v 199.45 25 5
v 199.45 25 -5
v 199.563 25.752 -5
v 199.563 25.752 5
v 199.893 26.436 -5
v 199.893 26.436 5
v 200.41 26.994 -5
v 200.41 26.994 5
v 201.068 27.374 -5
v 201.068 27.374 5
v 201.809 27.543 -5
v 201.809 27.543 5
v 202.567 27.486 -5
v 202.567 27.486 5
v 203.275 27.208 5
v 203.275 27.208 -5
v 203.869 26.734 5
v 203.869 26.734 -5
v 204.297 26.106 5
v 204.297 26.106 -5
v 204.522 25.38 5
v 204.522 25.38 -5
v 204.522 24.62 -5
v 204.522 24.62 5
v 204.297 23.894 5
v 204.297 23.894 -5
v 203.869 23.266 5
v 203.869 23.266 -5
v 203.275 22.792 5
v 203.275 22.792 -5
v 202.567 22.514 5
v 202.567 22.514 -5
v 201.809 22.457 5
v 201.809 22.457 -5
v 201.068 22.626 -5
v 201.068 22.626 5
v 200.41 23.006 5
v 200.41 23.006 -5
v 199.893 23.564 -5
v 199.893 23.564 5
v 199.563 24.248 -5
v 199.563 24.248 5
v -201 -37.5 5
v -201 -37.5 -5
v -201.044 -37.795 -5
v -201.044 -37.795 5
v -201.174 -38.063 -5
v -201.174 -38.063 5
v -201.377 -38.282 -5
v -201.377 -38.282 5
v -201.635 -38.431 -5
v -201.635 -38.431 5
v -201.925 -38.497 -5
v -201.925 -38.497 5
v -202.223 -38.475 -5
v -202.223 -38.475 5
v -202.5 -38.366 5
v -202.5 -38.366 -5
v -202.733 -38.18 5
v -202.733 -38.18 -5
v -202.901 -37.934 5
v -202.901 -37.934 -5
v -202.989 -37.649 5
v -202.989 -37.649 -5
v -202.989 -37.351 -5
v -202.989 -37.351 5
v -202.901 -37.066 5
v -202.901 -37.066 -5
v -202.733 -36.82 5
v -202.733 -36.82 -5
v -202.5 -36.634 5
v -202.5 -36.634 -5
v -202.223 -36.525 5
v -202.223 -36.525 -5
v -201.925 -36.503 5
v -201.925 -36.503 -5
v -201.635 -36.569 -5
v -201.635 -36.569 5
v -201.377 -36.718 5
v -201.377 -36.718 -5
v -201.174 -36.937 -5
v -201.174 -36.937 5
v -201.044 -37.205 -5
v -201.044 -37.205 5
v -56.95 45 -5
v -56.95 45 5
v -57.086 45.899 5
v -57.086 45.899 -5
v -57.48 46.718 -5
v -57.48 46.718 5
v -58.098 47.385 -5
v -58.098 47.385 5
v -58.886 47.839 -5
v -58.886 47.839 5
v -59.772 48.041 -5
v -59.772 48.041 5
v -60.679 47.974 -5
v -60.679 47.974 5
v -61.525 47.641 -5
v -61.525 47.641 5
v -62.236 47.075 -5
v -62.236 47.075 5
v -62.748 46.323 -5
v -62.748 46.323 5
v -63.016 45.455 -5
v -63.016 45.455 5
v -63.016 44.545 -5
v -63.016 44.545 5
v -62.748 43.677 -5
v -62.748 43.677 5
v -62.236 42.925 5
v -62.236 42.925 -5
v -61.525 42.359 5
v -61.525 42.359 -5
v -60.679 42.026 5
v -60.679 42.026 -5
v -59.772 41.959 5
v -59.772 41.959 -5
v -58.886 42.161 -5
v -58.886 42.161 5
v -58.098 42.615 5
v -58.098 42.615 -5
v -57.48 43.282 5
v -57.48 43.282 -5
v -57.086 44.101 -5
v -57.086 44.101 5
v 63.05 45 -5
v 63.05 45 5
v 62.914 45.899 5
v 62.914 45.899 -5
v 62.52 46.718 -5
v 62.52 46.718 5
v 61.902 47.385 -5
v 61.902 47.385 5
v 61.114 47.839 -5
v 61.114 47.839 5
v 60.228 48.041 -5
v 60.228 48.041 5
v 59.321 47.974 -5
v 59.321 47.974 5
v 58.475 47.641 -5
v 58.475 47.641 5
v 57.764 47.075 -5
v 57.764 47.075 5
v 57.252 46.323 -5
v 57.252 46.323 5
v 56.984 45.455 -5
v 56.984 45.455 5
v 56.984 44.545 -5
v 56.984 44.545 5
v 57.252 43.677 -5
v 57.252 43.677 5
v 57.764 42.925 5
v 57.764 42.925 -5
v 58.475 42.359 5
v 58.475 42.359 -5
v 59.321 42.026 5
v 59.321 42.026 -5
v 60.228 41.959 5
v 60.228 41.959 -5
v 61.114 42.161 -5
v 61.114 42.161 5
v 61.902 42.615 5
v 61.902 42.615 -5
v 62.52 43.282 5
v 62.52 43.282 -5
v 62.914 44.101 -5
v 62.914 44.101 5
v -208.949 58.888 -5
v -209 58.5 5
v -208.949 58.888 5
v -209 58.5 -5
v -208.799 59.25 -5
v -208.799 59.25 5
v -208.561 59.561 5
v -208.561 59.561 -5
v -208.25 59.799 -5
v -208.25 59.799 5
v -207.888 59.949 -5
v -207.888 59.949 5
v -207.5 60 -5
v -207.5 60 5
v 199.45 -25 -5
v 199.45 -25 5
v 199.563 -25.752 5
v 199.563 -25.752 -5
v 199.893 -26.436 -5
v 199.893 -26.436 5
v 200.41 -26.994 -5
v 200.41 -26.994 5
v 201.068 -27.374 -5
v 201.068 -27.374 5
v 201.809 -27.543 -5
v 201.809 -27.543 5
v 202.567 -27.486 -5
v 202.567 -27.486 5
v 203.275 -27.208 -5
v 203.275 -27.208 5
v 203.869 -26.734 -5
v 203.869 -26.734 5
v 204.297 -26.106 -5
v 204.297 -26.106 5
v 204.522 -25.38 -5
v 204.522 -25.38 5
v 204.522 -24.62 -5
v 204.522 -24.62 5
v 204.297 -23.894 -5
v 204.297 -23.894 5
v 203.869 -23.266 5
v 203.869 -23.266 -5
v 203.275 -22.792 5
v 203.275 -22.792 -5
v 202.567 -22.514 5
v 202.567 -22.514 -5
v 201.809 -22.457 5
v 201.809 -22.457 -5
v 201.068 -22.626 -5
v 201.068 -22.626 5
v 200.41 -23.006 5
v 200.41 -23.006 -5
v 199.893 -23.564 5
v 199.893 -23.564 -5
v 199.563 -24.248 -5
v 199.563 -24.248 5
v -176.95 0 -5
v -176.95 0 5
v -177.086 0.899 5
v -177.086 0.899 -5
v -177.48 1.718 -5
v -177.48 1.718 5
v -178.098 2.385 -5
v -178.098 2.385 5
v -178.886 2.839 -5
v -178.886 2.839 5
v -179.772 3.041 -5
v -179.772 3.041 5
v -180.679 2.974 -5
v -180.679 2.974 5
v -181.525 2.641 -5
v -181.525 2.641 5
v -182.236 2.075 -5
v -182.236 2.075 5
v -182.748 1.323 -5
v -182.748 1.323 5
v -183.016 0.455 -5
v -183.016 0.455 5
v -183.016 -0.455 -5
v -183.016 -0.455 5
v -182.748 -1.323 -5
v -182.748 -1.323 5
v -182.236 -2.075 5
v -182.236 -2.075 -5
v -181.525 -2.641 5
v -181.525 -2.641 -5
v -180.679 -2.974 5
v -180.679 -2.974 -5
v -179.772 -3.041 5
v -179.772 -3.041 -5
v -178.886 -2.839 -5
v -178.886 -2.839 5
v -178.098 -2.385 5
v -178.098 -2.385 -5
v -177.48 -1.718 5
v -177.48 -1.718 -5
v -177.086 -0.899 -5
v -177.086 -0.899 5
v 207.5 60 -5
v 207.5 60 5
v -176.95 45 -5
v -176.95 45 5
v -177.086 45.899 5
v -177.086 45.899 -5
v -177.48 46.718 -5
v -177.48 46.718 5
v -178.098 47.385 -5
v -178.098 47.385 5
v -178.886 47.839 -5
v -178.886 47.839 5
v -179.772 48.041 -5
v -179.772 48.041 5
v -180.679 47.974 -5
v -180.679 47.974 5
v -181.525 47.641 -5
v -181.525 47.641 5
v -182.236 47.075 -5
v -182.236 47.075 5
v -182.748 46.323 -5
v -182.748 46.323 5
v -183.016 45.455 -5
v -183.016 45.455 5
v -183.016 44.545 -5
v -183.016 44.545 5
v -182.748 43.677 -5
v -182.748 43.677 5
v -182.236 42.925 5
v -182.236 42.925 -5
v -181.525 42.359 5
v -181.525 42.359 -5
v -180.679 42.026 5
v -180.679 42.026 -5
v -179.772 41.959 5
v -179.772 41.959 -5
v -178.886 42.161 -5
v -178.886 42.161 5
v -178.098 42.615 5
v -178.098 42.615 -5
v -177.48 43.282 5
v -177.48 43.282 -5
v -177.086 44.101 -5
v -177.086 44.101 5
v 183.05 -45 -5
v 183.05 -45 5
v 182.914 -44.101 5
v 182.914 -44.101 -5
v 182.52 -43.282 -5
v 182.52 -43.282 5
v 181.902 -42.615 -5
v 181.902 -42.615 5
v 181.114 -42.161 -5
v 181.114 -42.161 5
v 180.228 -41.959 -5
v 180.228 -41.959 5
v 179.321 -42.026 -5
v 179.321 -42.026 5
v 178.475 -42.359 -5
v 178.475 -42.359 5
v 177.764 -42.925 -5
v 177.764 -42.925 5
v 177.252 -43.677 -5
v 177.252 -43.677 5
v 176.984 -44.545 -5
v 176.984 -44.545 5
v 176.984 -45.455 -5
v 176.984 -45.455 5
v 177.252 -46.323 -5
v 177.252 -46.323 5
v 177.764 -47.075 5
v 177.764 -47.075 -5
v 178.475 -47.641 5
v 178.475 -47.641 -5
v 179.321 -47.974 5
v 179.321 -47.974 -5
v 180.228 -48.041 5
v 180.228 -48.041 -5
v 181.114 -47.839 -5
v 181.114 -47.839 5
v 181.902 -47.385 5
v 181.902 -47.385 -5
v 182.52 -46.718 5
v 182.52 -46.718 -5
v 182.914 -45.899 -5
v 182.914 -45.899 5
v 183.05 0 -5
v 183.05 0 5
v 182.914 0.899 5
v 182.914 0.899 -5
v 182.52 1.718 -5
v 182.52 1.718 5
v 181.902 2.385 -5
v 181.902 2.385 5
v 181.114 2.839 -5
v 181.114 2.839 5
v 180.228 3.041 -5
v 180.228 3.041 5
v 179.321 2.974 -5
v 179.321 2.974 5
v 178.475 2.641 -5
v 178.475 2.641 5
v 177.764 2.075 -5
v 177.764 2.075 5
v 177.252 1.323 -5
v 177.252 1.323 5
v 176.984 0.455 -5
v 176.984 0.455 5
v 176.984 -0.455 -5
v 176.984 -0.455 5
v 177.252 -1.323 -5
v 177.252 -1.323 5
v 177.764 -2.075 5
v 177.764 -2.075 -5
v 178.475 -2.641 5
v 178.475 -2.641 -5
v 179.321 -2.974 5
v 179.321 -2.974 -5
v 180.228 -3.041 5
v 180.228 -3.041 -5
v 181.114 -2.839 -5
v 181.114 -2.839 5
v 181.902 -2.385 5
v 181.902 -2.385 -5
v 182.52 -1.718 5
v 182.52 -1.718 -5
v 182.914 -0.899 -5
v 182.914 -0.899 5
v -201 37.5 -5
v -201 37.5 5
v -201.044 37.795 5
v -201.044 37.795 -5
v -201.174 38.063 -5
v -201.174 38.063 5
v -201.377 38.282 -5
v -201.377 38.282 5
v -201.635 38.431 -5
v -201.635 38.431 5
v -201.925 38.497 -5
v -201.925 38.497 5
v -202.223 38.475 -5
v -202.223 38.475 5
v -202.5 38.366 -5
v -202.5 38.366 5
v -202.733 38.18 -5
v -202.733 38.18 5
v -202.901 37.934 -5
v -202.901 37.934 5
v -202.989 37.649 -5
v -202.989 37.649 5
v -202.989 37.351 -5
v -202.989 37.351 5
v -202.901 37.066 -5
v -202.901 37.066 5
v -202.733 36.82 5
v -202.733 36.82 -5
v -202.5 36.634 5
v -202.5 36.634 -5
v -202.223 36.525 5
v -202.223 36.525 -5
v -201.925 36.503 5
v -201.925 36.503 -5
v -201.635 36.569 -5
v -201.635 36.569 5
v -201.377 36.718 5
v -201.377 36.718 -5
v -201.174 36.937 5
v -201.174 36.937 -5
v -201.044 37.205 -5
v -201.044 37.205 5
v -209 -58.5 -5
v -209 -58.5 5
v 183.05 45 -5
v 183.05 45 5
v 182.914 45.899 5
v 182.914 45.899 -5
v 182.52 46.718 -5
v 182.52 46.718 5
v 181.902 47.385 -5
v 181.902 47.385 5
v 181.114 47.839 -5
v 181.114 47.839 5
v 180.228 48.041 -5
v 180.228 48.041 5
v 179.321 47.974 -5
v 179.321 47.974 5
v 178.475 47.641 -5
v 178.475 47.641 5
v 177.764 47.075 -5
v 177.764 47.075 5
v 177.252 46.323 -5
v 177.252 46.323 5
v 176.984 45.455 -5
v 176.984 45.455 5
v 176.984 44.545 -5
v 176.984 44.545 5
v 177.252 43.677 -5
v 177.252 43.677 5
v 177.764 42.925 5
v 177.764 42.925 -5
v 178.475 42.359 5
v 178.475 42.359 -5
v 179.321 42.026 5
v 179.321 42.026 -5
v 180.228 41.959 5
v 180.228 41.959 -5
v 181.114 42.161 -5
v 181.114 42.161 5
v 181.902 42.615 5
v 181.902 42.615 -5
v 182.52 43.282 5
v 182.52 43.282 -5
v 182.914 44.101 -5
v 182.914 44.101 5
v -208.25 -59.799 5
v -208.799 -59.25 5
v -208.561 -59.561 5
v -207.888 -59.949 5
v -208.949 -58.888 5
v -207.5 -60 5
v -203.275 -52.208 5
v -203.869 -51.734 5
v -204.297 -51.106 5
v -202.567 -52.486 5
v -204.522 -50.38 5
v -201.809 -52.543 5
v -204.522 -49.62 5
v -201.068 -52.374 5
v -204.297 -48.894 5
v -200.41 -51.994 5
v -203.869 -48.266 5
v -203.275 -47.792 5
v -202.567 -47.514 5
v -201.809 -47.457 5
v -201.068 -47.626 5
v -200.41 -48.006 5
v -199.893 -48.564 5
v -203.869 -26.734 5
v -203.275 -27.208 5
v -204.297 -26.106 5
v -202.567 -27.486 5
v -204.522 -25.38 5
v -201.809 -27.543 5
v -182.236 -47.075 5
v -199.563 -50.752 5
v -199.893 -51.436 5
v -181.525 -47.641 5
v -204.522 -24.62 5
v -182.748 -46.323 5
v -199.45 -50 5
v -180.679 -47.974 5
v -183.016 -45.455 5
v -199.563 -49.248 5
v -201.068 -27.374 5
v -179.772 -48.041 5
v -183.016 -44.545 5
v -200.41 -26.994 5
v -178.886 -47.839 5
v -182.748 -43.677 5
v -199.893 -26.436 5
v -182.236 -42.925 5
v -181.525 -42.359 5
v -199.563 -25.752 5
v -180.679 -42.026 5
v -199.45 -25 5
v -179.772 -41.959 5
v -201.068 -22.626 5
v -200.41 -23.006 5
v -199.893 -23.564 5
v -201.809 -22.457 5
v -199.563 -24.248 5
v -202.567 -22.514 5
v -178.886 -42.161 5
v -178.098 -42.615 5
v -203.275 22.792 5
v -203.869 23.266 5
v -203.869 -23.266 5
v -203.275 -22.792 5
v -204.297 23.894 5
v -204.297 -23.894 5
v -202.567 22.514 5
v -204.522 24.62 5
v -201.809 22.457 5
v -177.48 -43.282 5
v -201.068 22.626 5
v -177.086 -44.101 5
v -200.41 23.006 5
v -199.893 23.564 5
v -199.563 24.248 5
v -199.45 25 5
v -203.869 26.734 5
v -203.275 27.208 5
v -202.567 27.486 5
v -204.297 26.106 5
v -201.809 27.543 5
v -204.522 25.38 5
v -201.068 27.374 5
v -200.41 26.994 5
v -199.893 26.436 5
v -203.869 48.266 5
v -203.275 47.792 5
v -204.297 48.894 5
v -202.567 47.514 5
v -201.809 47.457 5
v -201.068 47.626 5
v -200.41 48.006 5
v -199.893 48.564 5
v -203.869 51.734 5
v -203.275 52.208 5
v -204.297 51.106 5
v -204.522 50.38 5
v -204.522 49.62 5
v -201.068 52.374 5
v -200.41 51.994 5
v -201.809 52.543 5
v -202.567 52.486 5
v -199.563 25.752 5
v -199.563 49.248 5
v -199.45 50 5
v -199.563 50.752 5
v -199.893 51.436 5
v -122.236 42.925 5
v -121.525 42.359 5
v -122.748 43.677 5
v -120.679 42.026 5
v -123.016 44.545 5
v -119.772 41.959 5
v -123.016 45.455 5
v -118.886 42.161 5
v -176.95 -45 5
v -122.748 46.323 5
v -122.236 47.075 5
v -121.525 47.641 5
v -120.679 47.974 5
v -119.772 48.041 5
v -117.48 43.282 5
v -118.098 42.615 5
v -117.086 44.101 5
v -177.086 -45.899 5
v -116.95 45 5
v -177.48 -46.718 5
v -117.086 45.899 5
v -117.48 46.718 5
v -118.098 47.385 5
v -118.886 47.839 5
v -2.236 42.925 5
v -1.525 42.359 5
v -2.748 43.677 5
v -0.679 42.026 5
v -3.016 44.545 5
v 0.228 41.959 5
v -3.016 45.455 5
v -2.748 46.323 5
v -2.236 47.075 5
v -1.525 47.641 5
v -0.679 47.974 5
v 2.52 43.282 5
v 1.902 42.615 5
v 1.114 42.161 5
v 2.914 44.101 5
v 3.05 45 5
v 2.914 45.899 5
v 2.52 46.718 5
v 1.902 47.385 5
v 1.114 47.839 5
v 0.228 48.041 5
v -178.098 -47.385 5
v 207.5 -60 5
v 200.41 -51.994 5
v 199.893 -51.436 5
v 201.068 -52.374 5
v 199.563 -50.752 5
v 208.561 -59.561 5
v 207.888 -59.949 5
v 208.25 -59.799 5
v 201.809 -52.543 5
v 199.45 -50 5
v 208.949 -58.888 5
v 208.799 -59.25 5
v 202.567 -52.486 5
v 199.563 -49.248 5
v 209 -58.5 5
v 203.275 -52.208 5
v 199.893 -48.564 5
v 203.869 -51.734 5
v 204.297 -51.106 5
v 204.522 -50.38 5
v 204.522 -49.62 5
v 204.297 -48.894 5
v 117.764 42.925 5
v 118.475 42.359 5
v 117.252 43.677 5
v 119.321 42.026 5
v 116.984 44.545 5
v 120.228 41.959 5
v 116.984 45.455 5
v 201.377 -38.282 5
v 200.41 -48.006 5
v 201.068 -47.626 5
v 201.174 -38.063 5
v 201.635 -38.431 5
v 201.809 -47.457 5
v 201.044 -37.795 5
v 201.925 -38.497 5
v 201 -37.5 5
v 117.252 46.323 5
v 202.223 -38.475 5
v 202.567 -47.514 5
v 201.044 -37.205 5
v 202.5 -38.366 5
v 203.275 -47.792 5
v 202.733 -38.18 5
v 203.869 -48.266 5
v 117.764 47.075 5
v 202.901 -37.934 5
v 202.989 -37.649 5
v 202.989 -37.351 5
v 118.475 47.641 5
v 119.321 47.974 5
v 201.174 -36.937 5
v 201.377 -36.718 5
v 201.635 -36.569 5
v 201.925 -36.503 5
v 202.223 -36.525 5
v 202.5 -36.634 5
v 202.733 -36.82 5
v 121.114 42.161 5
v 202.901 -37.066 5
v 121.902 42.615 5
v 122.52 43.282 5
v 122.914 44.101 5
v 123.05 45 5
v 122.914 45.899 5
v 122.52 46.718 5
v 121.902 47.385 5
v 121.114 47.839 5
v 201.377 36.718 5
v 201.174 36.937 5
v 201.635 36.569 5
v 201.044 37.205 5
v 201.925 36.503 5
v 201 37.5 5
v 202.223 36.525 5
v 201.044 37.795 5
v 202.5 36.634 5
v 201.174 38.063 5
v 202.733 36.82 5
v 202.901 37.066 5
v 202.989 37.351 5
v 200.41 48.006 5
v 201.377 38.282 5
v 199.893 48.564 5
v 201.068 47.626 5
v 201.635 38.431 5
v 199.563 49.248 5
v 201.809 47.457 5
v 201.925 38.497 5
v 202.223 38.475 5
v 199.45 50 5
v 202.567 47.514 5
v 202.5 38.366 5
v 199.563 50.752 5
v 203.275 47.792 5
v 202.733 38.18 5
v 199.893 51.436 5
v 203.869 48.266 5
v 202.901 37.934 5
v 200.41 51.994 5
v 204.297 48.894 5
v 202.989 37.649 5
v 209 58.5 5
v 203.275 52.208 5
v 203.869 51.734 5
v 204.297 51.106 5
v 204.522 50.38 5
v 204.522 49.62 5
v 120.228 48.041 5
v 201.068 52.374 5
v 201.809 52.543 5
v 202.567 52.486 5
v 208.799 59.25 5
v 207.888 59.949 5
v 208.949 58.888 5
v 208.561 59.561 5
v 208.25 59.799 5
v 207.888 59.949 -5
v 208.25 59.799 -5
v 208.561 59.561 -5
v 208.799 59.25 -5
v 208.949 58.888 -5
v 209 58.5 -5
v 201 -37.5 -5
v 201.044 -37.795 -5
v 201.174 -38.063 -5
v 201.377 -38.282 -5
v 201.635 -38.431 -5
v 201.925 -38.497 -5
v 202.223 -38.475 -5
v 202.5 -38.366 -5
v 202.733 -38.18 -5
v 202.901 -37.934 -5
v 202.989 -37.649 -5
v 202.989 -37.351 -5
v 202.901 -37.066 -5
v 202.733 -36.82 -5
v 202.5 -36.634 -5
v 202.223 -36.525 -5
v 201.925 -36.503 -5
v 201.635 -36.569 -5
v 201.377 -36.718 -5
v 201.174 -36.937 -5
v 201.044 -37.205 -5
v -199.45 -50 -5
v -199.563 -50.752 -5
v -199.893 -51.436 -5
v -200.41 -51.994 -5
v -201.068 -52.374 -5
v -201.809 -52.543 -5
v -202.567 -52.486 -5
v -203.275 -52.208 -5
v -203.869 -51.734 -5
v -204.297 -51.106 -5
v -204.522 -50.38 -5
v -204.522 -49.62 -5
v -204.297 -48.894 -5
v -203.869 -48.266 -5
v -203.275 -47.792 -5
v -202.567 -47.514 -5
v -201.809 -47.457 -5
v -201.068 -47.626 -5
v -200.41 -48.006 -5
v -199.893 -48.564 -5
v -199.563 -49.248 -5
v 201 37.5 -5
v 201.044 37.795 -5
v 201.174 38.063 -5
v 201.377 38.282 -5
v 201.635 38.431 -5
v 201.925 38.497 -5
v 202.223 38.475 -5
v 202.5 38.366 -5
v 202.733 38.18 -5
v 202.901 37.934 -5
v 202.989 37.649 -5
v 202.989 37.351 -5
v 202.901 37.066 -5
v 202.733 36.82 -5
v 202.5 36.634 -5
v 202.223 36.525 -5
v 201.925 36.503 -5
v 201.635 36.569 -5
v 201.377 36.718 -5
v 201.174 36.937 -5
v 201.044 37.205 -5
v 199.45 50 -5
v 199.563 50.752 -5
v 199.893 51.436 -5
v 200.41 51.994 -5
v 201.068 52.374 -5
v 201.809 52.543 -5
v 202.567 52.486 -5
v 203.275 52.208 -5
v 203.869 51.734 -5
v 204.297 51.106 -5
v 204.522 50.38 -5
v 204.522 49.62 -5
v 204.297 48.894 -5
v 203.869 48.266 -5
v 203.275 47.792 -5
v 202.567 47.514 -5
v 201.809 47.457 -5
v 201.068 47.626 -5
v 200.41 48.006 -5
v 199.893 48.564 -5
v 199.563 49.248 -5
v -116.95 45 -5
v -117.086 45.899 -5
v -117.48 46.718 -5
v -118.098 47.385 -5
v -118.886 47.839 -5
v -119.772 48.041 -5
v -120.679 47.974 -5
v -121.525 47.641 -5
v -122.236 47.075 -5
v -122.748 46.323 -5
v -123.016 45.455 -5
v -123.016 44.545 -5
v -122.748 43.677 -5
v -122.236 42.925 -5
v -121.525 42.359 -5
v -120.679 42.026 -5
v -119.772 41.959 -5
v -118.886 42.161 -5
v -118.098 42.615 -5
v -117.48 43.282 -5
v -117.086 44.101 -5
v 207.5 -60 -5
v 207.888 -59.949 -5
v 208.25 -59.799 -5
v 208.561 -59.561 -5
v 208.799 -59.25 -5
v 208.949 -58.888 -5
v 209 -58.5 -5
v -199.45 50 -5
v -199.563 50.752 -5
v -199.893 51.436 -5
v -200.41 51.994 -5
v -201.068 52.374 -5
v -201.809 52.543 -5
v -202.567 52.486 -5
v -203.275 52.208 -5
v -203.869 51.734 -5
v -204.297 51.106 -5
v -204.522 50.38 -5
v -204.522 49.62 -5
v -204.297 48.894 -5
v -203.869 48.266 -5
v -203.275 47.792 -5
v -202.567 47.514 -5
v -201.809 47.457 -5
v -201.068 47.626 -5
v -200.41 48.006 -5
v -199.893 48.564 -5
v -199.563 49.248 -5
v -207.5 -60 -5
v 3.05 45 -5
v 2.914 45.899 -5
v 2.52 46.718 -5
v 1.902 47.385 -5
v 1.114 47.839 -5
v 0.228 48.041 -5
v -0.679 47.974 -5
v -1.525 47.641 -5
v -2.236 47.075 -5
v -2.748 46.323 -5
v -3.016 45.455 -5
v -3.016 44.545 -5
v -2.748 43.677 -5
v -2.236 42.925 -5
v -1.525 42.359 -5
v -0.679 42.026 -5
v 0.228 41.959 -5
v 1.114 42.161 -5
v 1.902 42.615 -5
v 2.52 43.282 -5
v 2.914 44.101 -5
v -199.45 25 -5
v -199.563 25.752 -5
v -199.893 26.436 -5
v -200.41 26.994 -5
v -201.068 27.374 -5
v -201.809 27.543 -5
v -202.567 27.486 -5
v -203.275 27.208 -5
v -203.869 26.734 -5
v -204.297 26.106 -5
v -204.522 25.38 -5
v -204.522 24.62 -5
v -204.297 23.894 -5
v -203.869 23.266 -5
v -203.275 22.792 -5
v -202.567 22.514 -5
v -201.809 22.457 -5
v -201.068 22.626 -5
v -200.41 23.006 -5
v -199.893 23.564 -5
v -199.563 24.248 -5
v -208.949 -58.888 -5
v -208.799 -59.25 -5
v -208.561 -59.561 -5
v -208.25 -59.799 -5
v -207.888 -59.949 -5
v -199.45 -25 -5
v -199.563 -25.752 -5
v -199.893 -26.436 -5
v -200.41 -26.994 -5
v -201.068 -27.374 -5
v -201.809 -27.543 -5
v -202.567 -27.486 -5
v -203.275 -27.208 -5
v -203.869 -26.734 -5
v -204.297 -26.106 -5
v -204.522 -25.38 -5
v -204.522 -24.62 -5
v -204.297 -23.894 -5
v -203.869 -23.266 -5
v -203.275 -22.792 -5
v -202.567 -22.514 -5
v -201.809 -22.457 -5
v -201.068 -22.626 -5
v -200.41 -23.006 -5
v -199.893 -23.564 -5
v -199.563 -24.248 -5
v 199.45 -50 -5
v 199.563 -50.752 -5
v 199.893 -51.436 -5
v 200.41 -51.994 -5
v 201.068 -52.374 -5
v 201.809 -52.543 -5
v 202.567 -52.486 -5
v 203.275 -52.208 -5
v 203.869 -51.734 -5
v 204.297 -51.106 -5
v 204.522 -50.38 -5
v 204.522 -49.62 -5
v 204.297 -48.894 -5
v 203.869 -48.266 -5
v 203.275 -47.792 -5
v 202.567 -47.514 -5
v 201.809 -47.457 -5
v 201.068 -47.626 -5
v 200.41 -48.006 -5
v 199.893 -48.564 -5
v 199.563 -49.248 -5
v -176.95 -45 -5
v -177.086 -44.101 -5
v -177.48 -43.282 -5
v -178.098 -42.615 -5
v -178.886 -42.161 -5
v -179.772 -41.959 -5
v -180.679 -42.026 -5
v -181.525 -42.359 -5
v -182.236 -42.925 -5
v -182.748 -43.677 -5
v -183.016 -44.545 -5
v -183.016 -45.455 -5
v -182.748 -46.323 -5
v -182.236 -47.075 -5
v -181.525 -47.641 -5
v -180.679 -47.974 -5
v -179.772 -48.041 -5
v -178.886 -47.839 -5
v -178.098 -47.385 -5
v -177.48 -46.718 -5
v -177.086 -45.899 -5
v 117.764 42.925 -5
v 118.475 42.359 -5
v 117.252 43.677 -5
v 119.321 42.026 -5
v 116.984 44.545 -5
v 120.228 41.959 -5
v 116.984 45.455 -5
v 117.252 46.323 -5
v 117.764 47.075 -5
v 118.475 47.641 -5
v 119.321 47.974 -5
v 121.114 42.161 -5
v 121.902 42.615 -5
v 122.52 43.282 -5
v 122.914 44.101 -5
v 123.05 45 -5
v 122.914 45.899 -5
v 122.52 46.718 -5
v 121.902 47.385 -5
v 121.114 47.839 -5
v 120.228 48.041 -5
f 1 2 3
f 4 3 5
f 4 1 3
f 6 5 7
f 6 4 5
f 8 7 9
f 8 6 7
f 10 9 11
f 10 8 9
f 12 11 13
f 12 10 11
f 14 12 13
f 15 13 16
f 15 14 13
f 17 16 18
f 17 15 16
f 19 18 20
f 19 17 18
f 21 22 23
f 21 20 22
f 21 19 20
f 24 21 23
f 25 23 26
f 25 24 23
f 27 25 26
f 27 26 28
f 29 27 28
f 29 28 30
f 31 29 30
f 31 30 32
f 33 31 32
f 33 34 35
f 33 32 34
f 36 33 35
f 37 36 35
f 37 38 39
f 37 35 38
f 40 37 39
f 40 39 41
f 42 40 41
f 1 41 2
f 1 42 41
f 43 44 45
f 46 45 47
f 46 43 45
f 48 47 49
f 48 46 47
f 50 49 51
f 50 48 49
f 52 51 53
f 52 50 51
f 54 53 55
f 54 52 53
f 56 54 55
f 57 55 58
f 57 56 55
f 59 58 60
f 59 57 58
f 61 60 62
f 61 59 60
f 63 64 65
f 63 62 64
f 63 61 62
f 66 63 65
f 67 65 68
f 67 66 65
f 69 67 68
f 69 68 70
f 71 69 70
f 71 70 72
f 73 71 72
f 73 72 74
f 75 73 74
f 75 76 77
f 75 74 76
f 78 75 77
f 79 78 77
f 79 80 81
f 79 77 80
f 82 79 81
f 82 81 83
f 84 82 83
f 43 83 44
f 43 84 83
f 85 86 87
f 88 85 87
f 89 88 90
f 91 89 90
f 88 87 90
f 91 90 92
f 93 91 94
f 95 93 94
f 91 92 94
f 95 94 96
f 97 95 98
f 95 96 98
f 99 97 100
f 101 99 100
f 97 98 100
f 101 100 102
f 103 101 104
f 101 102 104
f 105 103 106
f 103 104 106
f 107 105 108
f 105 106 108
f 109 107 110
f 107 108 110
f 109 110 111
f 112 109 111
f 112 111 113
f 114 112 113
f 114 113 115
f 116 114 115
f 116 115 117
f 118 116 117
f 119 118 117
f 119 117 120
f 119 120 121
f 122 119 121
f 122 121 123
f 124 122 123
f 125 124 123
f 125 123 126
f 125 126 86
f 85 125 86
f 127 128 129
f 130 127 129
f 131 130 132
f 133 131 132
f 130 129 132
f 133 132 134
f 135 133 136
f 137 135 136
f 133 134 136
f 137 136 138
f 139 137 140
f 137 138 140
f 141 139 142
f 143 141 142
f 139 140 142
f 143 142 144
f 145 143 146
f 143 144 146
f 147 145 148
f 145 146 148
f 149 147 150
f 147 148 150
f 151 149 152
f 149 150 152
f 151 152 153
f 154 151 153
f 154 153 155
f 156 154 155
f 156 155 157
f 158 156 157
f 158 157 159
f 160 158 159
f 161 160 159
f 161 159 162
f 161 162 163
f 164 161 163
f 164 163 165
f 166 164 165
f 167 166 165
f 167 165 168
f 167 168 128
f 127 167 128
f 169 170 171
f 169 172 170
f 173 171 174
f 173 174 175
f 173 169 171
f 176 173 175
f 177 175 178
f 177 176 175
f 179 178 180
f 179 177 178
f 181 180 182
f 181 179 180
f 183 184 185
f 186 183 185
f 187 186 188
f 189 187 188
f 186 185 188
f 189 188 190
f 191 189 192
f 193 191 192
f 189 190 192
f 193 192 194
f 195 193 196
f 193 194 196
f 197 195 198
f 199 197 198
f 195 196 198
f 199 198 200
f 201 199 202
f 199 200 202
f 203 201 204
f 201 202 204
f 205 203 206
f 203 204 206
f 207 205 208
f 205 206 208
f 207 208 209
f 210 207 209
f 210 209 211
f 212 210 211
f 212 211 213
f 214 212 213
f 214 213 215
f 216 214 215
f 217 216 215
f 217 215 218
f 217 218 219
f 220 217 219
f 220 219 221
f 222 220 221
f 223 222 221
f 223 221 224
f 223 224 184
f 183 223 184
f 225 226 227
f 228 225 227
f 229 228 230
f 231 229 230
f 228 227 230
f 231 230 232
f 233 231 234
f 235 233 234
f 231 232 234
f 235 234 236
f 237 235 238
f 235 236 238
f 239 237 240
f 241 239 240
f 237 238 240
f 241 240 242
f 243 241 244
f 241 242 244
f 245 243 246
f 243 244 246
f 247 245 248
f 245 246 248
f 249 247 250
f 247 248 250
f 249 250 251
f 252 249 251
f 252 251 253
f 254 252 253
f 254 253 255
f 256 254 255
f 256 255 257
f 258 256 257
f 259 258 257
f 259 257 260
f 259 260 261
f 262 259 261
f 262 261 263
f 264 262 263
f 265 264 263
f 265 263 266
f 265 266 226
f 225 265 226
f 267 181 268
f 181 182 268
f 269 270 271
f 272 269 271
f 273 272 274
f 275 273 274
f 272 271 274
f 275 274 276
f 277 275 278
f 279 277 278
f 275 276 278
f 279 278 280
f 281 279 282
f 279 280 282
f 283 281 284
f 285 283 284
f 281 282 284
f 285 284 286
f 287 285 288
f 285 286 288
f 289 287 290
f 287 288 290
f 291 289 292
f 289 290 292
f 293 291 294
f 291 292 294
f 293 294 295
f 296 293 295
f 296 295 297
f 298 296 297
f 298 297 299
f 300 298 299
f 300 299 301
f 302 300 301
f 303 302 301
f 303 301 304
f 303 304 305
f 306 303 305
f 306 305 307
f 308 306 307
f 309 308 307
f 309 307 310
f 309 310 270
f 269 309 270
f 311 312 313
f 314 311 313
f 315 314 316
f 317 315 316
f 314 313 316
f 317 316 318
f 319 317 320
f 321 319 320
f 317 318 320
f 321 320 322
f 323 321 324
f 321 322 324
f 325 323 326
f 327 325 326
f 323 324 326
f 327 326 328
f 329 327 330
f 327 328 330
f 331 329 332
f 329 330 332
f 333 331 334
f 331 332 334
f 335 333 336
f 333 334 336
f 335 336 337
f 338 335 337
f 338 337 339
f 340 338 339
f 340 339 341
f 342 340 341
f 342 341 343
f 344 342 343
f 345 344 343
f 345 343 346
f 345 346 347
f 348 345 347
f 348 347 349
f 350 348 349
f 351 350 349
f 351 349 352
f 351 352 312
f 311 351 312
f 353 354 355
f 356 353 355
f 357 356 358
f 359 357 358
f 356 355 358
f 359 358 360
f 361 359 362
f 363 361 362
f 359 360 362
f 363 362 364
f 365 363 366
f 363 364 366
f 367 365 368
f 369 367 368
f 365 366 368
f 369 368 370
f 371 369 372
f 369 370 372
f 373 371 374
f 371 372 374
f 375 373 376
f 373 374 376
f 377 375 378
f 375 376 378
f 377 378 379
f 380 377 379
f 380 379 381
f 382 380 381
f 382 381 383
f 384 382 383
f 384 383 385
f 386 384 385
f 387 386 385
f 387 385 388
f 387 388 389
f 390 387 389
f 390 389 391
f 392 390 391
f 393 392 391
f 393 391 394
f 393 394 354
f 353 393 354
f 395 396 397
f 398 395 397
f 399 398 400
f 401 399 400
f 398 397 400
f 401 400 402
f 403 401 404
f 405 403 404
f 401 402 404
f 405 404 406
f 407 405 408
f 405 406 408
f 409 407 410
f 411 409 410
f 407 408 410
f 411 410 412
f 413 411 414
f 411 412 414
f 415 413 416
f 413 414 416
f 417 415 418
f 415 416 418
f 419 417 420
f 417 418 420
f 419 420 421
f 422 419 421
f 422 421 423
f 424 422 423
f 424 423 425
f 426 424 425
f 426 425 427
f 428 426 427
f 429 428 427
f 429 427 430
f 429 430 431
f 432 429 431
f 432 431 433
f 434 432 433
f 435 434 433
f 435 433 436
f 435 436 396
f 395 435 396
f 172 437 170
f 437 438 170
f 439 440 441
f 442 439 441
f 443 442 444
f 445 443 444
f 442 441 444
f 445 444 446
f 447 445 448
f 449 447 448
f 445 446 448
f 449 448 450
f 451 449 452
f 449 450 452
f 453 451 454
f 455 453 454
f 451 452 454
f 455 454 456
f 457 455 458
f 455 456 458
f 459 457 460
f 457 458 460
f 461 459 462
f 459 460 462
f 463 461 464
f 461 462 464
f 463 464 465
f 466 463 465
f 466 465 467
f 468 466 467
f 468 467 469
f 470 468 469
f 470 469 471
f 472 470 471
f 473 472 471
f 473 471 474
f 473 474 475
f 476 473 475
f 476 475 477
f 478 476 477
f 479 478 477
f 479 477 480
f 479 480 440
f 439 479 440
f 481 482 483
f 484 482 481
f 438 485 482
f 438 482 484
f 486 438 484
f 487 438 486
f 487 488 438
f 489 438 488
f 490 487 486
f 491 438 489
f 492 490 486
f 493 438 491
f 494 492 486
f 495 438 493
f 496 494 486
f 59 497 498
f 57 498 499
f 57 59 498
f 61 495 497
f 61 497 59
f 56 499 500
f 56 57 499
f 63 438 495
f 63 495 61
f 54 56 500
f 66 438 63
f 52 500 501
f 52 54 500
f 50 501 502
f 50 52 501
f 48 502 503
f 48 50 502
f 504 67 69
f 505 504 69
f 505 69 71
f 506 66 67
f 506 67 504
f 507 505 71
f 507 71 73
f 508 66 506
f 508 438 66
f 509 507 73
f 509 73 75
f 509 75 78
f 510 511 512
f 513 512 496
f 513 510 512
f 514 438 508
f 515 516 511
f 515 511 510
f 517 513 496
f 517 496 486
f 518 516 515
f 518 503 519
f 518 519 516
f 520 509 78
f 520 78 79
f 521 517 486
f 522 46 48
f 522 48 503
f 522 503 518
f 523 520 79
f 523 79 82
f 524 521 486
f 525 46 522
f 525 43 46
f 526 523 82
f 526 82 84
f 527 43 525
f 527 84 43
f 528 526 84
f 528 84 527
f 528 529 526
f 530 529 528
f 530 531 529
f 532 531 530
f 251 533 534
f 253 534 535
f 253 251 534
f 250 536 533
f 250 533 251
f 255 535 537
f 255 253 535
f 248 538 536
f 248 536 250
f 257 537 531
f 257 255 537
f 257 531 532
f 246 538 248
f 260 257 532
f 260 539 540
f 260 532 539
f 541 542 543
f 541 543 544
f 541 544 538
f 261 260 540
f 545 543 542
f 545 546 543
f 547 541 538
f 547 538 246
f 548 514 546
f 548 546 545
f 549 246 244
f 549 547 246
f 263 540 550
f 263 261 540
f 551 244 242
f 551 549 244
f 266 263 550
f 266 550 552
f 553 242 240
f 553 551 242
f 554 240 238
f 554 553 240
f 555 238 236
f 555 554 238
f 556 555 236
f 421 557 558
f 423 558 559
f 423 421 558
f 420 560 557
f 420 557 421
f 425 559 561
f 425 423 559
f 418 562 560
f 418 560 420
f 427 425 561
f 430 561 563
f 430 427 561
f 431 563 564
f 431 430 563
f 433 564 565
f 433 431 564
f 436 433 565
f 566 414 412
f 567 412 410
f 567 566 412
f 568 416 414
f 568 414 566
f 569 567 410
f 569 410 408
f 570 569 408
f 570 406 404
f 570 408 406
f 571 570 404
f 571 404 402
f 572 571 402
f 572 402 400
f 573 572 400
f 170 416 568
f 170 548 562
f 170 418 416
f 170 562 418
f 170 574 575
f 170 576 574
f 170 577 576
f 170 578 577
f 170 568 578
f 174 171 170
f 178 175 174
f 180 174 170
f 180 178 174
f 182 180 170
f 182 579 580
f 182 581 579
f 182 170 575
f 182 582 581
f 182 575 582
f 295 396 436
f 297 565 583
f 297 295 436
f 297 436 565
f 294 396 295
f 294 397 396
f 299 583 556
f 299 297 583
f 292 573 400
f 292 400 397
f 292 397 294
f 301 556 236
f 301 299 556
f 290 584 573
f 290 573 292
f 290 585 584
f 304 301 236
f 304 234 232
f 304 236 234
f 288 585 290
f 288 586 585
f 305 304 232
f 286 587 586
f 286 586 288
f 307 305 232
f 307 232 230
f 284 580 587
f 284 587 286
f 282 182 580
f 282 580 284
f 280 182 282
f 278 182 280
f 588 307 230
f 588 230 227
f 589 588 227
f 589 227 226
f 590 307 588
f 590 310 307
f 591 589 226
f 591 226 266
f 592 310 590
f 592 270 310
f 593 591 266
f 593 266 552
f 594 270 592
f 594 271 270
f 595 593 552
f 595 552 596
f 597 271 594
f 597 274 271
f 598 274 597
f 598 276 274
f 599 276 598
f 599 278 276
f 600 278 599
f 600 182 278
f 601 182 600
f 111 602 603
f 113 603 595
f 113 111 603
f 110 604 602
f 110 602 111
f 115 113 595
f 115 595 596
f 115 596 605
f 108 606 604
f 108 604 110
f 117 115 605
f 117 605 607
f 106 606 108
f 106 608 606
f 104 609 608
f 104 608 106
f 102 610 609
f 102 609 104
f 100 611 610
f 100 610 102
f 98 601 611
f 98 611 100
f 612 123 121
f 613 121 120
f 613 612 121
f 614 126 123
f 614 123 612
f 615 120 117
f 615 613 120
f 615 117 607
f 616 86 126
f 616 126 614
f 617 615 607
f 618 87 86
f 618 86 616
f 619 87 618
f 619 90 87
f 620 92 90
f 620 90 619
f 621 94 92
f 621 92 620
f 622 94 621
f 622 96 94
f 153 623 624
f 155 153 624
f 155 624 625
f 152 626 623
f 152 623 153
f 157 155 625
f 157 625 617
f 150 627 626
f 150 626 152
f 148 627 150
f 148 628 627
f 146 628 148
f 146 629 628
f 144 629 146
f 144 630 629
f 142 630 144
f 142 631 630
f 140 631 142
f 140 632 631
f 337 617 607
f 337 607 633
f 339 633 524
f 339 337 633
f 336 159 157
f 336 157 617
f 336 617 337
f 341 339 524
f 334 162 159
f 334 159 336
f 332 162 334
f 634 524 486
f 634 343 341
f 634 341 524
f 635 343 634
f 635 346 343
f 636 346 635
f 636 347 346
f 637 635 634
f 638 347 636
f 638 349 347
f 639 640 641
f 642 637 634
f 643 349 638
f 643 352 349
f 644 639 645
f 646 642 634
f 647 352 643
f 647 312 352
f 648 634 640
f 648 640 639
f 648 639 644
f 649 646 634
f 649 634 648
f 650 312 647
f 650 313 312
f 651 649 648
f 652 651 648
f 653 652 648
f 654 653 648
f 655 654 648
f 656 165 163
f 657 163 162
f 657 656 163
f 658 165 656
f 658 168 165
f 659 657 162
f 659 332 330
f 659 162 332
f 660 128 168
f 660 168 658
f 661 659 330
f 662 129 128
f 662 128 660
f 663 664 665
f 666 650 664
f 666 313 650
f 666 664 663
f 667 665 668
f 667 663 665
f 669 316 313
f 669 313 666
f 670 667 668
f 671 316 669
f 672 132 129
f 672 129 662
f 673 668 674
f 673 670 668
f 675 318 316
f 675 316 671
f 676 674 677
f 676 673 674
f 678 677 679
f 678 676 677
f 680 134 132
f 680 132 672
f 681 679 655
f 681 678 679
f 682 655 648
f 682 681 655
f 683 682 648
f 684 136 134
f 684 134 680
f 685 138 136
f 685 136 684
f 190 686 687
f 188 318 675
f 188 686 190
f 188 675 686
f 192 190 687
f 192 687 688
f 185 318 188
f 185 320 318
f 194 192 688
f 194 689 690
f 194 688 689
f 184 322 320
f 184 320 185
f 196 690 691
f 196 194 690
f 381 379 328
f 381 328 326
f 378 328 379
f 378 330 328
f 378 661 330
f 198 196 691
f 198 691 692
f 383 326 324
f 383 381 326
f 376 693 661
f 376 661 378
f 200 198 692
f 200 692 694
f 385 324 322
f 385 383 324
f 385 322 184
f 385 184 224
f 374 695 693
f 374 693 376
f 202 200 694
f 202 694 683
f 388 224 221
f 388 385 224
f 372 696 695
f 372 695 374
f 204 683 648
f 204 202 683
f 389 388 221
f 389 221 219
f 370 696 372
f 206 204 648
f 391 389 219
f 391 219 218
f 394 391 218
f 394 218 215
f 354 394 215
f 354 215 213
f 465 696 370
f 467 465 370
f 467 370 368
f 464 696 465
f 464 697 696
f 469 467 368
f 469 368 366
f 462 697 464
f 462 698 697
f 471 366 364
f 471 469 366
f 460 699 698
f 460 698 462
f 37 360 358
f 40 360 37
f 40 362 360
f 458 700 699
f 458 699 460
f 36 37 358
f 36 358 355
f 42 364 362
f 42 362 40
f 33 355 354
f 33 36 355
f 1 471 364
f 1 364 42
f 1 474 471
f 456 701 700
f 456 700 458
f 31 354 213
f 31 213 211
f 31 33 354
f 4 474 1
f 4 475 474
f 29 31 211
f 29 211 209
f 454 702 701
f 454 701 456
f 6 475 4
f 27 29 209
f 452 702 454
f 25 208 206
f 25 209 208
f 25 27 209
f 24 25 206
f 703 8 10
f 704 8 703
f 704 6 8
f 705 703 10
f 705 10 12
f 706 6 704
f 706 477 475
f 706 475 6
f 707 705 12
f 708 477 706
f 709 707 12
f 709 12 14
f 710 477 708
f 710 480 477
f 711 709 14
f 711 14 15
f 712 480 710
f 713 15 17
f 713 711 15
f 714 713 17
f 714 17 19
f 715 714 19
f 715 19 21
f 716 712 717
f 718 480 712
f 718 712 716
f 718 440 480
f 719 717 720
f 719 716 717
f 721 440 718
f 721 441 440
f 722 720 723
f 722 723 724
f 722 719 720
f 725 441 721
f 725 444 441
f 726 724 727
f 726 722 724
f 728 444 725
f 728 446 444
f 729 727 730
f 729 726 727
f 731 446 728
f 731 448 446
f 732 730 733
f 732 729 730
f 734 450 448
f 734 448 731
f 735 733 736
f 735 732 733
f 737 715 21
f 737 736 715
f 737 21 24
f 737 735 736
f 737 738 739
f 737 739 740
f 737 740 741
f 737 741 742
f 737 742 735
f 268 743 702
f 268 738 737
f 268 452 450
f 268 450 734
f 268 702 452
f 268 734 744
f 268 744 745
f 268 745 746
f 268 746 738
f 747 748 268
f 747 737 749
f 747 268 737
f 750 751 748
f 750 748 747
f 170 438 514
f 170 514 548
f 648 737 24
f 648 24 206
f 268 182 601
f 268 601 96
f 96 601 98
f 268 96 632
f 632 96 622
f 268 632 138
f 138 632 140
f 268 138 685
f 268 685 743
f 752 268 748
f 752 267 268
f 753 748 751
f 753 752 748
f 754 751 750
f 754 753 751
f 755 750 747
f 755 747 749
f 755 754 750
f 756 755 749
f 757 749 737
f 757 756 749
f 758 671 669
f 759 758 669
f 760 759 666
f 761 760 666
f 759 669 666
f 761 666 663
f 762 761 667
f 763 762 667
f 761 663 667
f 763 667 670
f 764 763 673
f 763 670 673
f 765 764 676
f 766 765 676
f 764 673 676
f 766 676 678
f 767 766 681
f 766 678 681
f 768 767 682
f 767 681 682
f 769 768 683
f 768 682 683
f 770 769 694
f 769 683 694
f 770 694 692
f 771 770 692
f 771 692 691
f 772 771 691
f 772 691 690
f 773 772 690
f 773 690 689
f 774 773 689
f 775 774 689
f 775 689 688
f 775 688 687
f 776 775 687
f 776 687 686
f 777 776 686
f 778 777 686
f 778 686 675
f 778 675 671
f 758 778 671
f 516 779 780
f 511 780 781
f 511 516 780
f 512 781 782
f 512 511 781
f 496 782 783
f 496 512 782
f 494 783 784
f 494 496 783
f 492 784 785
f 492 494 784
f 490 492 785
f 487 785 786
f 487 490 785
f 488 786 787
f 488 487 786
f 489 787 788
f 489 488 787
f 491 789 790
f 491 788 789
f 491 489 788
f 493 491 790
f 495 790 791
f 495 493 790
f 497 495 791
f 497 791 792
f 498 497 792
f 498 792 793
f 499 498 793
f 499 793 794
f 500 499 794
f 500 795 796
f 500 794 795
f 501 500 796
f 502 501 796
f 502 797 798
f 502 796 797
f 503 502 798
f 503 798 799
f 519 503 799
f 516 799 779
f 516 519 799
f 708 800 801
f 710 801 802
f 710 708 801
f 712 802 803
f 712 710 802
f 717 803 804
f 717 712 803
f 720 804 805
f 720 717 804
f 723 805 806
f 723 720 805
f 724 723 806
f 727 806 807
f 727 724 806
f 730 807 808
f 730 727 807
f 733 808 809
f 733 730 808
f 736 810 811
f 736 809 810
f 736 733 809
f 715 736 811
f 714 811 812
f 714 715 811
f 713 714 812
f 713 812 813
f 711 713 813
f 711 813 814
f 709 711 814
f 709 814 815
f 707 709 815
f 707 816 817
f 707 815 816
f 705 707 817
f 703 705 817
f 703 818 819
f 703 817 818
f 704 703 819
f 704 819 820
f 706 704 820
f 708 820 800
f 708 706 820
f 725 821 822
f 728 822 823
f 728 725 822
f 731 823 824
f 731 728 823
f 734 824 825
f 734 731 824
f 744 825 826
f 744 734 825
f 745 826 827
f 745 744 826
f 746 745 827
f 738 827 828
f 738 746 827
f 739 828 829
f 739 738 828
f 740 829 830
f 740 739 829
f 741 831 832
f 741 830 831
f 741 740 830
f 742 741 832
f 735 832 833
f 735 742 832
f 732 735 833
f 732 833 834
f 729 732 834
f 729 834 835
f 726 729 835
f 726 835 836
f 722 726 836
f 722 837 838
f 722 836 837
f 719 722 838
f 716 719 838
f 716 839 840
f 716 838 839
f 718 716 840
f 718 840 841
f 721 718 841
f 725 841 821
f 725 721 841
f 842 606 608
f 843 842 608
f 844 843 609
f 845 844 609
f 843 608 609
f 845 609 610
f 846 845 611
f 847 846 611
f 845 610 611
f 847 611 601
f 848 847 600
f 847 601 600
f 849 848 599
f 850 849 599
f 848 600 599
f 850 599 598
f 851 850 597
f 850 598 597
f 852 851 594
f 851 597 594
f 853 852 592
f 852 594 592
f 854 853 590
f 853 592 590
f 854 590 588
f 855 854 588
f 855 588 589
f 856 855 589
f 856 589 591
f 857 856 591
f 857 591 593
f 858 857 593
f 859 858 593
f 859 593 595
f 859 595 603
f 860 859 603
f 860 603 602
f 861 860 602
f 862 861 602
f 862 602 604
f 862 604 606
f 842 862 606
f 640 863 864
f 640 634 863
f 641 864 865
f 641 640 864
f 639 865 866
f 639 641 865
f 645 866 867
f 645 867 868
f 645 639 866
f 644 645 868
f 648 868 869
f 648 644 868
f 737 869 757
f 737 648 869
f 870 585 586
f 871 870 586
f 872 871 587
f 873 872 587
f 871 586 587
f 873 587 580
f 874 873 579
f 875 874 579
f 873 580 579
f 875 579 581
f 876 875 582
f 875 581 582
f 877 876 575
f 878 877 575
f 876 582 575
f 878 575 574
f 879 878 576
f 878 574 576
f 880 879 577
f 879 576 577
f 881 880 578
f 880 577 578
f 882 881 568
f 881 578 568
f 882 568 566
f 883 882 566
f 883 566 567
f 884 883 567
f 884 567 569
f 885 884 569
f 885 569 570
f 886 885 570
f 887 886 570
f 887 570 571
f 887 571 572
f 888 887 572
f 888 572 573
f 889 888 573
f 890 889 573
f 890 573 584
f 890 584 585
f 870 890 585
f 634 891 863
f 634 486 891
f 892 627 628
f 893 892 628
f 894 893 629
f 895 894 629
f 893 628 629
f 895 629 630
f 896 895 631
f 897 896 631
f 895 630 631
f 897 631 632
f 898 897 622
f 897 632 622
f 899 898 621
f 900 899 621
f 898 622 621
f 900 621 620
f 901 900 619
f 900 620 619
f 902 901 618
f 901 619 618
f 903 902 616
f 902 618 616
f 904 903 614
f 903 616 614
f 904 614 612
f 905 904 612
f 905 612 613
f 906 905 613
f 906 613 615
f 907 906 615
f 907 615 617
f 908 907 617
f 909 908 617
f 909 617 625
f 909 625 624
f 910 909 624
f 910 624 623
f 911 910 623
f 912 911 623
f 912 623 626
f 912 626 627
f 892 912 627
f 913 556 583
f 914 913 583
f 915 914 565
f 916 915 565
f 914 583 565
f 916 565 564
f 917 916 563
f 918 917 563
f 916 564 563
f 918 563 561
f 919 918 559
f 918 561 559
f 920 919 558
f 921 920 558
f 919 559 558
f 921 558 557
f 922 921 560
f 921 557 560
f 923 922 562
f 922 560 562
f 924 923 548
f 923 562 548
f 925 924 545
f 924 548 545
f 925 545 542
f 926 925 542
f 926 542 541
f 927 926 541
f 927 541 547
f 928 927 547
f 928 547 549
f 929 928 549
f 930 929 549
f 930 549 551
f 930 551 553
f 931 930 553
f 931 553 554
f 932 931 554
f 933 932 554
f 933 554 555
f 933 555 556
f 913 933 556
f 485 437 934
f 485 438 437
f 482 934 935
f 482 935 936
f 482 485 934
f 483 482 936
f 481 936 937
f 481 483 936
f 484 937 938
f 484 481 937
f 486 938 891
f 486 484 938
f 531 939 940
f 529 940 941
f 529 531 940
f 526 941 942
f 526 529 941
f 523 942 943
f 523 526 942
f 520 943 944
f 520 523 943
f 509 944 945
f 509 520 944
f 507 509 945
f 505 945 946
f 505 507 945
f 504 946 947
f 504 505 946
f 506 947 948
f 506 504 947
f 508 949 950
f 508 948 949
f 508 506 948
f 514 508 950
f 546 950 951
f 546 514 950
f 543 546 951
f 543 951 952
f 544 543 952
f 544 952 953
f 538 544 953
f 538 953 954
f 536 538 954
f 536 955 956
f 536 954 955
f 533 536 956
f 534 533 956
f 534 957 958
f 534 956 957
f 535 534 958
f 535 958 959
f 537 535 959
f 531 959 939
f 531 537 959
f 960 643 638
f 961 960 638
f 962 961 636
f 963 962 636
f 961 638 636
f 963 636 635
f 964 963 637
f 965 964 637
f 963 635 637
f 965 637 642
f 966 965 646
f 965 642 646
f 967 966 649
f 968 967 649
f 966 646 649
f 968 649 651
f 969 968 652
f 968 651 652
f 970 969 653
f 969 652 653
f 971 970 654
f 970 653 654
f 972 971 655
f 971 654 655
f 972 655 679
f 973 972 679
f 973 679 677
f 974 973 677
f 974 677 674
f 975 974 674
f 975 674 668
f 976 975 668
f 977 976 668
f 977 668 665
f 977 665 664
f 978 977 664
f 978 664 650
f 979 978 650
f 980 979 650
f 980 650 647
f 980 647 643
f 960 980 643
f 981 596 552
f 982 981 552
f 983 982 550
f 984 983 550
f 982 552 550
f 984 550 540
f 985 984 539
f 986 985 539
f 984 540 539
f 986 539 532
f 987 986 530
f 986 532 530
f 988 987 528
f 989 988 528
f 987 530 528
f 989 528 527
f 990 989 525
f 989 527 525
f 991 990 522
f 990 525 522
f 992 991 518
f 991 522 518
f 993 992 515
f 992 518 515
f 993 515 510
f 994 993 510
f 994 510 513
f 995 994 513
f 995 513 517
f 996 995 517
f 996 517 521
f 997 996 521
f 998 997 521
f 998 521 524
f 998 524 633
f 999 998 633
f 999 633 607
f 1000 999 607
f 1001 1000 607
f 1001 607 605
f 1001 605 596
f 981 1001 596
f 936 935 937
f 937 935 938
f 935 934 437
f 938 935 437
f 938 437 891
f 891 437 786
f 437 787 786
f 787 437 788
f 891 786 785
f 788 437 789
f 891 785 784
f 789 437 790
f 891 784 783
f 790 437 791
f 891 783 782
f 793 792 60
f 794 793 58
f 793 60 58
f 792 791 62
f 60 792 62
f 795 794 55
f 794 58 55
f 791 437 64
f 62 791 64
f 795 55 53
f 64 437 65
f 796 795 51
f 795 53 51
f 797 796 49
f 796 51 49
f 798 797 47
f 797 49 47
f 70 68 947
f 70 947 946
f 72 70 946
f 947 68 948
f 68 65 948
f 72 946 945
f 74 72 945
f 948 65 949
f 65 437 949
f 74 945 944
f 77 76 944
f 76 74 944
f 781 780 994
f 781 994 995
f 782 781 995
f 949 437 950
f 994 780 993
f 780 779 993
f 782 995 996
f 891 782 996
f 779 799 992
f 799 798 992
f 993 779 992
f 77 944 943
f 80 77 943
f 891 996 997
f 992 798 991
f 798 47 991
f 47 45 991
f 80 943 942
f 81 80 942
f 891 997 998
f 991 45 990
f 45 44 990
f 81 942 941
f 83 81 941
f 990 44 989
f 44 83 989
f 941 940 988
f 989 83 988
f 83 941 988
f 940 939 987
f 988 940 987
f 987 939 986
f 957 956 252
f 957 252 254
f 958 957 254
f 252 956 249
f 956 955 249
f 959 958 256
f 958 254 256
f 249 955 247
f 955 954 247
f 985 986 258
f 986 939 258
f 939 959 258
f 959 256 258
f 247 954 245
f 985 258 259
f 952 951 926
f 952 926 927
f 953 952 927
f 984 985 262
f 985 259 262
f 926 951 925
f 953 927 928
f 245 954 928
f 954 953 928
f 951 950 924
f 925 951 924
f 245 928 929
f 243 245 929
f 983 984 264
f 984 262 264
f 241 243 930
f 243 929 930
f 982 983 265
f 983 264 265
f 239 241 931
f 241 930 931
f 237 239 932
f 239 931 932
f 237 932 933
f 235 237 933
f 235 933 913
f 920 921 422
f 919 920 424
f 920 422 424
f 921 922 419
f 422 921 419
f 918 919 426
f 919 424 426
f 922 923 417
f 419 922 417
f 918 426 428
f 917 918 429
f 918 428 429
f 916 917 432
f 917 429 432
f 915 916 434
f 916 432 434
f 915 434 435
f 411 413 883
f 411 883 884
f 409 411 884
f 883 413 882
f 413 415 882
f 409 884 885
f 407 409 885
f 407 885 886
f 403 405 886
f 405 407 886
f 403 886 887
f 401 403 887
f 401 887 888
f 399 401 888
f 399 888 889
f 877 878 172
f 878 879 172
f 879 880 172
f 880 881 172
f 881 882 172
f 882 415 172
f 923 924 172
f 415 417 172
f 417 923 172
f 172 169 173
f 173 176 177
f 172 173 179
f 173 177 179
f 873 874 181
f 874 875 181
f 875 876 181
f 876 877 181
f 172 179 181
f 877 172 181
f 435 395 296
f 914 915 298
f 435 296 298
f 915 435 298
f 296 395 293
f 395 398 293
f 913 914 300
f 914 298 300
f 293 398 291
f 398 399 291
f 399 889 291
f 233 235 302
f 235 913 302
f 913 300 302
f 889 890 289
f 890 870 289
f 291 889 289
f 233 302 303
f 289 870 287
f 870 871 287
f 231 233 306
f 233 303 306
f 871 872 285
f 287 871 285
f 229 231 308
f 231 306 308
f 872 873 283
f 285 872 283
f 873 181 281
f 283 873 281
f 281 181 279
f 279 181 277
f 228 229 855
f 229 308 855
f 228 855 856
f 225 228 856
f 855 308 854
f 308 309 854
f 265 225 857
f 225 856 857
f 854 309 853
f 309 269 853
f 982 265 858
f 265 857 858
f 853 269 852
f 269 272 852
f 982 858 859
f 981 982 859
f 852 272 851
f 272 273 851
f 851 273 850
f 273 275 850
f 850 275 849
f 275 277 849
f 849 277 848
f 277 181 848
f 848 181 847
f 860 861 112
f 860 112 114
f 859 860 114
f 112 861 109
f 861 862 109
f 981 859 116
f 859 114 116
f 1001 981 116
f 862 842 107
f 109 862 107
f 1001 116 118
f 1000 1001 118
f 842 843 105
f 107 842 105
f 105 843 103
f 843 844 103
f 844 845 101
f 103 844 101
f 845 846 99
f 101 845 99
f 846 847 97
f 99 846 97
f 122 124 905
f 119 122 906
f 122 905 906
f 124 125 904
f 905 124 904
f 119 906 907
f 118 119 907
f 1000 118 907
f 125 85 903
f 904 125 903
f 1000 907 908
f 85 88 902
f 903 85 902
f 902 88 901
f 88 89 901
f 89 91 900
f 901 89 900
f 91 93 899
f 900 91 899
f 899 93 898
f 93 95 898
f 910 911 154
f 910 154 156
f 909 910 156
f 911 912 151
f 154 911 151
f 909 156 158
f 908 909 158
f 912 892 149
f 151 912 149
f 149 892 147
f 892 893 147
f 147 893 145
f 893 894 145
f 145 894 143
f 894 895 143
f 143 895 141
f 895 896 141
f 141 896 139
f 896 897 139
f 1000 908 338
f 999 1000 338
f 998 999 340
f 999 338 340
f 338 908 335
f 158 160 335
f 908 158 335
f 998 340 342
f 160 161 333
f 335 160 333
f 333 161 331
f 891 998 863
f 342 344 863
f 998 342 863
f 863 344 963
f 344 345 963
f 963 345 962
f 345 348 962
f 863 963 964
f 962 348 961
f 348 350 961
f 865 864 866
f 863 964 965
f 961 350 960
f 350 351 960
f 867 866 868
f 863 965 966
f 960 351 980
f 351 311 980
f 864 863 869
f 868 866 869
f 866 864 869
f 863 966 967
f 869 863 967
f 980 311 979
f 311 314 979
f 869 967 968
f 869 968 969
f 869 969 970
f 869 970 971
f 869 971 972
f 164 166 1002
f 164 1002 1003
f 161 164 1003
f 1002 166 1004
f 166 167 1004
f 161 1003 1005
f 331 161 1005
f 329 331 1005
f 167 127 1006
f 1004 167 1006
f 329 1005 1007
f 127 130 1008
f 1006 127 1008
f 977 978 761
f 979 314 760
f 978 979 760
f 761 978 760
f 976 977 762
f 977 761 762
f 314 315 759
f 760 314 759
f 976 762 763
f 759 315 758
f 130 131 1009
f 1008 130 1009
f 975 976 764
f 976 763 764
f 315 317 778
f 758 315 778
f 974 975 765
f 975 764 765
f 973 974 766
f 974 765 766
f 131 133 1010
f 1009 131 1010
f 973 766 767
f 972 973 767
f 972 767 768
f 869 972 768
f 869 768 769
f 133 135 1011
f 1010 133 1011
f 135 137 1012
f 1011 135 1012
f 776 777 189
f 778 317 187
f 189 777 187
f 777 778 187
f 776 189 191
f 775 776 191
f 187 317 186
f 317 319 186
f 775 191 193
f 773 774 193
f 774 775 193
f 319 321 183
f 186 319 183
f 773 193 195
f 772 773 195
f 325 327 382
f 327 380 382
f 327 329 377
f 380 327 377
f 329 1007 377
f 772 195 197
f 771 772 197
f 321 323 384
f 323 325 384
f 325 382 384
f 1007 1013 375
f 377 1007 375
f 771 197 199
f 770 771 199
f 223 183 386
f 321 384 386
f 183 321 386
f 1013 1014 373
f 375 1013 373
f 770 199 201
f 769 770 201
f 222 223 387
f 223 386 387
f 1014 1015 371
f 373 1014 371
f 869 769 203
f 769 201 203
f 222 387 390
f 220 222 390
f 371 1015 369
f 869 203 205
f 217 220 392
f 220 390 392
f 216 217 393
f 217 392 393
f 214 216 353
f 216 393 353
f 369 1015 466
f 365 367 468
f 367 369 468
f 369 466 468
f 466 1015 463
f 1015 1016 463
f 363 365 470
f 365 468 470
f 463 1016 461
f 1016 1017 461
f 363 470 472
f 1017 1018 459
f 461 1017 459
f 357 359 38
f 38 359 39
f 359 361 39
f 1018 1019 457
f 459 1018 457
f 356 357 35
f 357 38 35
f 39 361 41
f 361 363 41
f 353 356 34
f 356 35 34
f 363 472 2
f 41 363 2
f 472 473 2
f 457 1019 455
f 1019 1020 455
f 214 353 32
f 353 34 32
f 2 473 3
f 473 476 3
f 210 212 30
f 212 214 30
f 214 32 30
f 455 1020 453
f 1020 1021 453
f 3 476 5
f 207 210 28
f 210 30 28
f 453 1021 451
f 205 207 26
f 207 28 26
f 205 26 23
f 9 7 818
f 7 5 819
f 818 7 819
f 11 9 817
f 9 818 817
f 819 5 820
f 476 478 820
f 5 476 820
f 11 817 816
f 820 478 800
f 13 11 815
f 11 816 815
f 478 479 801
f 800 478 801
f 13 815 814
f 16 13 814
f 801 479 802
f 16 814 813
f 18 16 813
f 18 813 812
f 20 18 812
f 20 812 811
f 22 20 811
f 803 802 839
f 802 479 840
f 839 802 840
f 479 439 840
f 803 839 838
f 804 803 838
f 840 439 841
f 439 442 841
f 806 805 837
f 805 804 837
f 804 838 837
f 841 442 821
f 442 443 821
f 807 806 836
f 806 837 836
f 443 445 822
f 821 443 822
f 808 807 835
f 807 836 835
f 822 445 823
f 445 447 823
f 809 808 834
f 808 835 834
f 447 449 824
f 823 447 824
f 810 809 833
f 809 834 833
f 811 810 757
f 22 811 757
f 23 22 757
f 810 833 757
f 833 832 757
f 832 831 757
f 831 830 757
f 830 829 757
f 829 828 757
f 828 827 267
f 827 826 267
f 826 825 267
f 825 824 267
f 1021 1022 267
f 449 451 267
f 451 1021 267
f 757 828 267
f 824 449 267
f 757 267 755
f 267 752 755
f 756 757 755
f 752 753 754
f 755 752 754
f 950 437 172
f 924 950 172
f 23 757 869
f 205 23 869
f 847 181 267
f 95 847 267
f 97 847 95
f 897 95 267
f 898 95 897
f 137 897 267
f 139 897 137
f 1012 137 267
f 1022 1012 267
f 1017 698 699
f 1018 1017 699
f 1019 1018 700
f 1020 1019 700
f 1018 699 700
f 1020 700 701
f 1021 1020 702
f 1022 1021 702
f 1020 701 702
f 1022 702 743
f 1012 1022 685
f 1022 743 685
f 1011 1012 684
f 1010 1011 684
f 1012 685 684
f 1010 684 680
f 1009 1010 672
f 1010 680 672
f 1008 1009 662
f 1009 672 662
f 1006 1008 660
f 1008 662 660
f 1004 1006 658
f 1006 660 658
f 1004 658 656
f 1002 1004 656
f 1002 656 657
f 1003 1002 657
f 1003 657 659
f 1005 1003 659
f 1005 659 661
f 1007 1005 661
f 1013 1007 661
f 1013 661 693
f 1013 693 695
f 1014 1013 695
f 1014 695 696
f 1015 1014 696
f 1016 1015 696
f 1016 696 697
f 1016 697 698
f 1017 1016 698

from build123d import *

# Parameters (mm, degrees)
SKETCH1_W                 = 418
SKETCH1_H                 = 120
BOSS_EXTRUDE1_DEPTH       = 5
SKETCH3_R                 = 3.05
CUT_EXTRUDE2_DEPTH        = 11
FILLET1_R                 = 1.5
SKETCH4_R                 = 2.55
SKETCH4_R_2               = 1
CUT_EXTRUDE3_DEPTH        = 11
MIRROR2_COPY_1_SKETCH_R   = 2.55
MIRROR2_COPY_1_SKETCH_R_2 = 1
MIRROR2_COPY_1_DEPTH      = 11


with BuildPart() as part:
    # Sketch1 → Boss-Extrude1 (new body, symmetric)
    with BuildSketch(Plane.XY):
        Rectangle(SKETCH1_W, SKETCH1_H)
    extrude(amount=BOSS_EXTRUDE1_DEPTH, both=True)

    # Sketch3 → Cut-Extrude2 (cut, through all)
    with BuildSketch(Plane.XY.offset(5)):
        with Locations((-180, 45)):
            Circle(SKETCH3_R)
        with Locations((180, 45)):
            Circle(SKETCH3_R)
        with Locations((180, -45)):
            Circle(SKETCH3_R)
        with Locations((-180, -45)):
            Circle(SKETCH3_R)
        with Locations((0, 45)):
            Circle(SKETCH3_R)
        with Locations((-120, 45)):
            Circle(SKETCH3_R)
        with Locations((120, 45)):
            Circle(SKETCH3_R)
        with Locations((-180, 0)):
            Circle(SKETCH3_R)
        with Locations((-60, 45)):
            Circle(SKETCH3_R)
        with Locations((60, 45)):
            Circle(SKETCH3_R)
        with Locations((180, 0)):
            Circle(SKETCH3_R)
    extrude(amount=-CUT_EXTRUDE2_DEPTH, mode=Mode.SUBTRACT)

    # Fillet1
    fillet1_edges = [part.edges().sort_by_distance(p)[0] for p in [
        (-209, 60, 0),
        (209, 60, 0),
        (209, -60, 0),
        (-209, -60, 0),
    ]]
    fillet(fillet1_edges, radius=FILLET1_R)

    # Sketch4 → Cut-Extrude3 (cut, through all)
    with BuildSketch(Plane.XY.offset(5)):
        with Locations((-202, 50)):
            Circle(SKETCH4_R)
        with Locations((-202, 37.5)):
            Circle(SKETCH4_R_2)
        with Locations((-202, 25)):
            Circle(SKETCH4_R)
    cut_extrude3 = extrude(amount=-CUT_EXTRUDE3_DEPTH, mode=Mode.SUBTRACT)

    # Mirror1: Cut-Extrude3 across plane
    add(cut_extrude3.mirror(Plane.ZX), mode=Mode.SUBTRACT)

    # Mirror2: Cut-Extrude3 across plane
    add(cut_extrude3.mirror(Plane(origin=(0, 0, 0), x_dir=(0, 0, 1), z_dir=(1, 0, 0))), mode=Mode.SUBTRACT)

    # Mirror2 copy 1 sketch → Mirror2 copy 1 (cut, through all)
    with BuildSketch(Plane(origin=(0, 0, 5), x_dir=(-1, 0, 0), z_dir=(0, 0, 1))):
        with Locations((-202, 50)):
            Circle(MIRROR2_COPY_1_SKETCH_R)
        with Locations((-202, 37.5)):
            Circle(MIRROR2_COPY_1_SKETCH_R_2)
        with Locations((-202, 25)):
            Circle(MIRROR2_COPY_1_SKETCH_R)
    extrude(amount=-MIRROR2_COPY_1_DEPTH, mode=Mode.SUBTRACT)


solid = part.part
